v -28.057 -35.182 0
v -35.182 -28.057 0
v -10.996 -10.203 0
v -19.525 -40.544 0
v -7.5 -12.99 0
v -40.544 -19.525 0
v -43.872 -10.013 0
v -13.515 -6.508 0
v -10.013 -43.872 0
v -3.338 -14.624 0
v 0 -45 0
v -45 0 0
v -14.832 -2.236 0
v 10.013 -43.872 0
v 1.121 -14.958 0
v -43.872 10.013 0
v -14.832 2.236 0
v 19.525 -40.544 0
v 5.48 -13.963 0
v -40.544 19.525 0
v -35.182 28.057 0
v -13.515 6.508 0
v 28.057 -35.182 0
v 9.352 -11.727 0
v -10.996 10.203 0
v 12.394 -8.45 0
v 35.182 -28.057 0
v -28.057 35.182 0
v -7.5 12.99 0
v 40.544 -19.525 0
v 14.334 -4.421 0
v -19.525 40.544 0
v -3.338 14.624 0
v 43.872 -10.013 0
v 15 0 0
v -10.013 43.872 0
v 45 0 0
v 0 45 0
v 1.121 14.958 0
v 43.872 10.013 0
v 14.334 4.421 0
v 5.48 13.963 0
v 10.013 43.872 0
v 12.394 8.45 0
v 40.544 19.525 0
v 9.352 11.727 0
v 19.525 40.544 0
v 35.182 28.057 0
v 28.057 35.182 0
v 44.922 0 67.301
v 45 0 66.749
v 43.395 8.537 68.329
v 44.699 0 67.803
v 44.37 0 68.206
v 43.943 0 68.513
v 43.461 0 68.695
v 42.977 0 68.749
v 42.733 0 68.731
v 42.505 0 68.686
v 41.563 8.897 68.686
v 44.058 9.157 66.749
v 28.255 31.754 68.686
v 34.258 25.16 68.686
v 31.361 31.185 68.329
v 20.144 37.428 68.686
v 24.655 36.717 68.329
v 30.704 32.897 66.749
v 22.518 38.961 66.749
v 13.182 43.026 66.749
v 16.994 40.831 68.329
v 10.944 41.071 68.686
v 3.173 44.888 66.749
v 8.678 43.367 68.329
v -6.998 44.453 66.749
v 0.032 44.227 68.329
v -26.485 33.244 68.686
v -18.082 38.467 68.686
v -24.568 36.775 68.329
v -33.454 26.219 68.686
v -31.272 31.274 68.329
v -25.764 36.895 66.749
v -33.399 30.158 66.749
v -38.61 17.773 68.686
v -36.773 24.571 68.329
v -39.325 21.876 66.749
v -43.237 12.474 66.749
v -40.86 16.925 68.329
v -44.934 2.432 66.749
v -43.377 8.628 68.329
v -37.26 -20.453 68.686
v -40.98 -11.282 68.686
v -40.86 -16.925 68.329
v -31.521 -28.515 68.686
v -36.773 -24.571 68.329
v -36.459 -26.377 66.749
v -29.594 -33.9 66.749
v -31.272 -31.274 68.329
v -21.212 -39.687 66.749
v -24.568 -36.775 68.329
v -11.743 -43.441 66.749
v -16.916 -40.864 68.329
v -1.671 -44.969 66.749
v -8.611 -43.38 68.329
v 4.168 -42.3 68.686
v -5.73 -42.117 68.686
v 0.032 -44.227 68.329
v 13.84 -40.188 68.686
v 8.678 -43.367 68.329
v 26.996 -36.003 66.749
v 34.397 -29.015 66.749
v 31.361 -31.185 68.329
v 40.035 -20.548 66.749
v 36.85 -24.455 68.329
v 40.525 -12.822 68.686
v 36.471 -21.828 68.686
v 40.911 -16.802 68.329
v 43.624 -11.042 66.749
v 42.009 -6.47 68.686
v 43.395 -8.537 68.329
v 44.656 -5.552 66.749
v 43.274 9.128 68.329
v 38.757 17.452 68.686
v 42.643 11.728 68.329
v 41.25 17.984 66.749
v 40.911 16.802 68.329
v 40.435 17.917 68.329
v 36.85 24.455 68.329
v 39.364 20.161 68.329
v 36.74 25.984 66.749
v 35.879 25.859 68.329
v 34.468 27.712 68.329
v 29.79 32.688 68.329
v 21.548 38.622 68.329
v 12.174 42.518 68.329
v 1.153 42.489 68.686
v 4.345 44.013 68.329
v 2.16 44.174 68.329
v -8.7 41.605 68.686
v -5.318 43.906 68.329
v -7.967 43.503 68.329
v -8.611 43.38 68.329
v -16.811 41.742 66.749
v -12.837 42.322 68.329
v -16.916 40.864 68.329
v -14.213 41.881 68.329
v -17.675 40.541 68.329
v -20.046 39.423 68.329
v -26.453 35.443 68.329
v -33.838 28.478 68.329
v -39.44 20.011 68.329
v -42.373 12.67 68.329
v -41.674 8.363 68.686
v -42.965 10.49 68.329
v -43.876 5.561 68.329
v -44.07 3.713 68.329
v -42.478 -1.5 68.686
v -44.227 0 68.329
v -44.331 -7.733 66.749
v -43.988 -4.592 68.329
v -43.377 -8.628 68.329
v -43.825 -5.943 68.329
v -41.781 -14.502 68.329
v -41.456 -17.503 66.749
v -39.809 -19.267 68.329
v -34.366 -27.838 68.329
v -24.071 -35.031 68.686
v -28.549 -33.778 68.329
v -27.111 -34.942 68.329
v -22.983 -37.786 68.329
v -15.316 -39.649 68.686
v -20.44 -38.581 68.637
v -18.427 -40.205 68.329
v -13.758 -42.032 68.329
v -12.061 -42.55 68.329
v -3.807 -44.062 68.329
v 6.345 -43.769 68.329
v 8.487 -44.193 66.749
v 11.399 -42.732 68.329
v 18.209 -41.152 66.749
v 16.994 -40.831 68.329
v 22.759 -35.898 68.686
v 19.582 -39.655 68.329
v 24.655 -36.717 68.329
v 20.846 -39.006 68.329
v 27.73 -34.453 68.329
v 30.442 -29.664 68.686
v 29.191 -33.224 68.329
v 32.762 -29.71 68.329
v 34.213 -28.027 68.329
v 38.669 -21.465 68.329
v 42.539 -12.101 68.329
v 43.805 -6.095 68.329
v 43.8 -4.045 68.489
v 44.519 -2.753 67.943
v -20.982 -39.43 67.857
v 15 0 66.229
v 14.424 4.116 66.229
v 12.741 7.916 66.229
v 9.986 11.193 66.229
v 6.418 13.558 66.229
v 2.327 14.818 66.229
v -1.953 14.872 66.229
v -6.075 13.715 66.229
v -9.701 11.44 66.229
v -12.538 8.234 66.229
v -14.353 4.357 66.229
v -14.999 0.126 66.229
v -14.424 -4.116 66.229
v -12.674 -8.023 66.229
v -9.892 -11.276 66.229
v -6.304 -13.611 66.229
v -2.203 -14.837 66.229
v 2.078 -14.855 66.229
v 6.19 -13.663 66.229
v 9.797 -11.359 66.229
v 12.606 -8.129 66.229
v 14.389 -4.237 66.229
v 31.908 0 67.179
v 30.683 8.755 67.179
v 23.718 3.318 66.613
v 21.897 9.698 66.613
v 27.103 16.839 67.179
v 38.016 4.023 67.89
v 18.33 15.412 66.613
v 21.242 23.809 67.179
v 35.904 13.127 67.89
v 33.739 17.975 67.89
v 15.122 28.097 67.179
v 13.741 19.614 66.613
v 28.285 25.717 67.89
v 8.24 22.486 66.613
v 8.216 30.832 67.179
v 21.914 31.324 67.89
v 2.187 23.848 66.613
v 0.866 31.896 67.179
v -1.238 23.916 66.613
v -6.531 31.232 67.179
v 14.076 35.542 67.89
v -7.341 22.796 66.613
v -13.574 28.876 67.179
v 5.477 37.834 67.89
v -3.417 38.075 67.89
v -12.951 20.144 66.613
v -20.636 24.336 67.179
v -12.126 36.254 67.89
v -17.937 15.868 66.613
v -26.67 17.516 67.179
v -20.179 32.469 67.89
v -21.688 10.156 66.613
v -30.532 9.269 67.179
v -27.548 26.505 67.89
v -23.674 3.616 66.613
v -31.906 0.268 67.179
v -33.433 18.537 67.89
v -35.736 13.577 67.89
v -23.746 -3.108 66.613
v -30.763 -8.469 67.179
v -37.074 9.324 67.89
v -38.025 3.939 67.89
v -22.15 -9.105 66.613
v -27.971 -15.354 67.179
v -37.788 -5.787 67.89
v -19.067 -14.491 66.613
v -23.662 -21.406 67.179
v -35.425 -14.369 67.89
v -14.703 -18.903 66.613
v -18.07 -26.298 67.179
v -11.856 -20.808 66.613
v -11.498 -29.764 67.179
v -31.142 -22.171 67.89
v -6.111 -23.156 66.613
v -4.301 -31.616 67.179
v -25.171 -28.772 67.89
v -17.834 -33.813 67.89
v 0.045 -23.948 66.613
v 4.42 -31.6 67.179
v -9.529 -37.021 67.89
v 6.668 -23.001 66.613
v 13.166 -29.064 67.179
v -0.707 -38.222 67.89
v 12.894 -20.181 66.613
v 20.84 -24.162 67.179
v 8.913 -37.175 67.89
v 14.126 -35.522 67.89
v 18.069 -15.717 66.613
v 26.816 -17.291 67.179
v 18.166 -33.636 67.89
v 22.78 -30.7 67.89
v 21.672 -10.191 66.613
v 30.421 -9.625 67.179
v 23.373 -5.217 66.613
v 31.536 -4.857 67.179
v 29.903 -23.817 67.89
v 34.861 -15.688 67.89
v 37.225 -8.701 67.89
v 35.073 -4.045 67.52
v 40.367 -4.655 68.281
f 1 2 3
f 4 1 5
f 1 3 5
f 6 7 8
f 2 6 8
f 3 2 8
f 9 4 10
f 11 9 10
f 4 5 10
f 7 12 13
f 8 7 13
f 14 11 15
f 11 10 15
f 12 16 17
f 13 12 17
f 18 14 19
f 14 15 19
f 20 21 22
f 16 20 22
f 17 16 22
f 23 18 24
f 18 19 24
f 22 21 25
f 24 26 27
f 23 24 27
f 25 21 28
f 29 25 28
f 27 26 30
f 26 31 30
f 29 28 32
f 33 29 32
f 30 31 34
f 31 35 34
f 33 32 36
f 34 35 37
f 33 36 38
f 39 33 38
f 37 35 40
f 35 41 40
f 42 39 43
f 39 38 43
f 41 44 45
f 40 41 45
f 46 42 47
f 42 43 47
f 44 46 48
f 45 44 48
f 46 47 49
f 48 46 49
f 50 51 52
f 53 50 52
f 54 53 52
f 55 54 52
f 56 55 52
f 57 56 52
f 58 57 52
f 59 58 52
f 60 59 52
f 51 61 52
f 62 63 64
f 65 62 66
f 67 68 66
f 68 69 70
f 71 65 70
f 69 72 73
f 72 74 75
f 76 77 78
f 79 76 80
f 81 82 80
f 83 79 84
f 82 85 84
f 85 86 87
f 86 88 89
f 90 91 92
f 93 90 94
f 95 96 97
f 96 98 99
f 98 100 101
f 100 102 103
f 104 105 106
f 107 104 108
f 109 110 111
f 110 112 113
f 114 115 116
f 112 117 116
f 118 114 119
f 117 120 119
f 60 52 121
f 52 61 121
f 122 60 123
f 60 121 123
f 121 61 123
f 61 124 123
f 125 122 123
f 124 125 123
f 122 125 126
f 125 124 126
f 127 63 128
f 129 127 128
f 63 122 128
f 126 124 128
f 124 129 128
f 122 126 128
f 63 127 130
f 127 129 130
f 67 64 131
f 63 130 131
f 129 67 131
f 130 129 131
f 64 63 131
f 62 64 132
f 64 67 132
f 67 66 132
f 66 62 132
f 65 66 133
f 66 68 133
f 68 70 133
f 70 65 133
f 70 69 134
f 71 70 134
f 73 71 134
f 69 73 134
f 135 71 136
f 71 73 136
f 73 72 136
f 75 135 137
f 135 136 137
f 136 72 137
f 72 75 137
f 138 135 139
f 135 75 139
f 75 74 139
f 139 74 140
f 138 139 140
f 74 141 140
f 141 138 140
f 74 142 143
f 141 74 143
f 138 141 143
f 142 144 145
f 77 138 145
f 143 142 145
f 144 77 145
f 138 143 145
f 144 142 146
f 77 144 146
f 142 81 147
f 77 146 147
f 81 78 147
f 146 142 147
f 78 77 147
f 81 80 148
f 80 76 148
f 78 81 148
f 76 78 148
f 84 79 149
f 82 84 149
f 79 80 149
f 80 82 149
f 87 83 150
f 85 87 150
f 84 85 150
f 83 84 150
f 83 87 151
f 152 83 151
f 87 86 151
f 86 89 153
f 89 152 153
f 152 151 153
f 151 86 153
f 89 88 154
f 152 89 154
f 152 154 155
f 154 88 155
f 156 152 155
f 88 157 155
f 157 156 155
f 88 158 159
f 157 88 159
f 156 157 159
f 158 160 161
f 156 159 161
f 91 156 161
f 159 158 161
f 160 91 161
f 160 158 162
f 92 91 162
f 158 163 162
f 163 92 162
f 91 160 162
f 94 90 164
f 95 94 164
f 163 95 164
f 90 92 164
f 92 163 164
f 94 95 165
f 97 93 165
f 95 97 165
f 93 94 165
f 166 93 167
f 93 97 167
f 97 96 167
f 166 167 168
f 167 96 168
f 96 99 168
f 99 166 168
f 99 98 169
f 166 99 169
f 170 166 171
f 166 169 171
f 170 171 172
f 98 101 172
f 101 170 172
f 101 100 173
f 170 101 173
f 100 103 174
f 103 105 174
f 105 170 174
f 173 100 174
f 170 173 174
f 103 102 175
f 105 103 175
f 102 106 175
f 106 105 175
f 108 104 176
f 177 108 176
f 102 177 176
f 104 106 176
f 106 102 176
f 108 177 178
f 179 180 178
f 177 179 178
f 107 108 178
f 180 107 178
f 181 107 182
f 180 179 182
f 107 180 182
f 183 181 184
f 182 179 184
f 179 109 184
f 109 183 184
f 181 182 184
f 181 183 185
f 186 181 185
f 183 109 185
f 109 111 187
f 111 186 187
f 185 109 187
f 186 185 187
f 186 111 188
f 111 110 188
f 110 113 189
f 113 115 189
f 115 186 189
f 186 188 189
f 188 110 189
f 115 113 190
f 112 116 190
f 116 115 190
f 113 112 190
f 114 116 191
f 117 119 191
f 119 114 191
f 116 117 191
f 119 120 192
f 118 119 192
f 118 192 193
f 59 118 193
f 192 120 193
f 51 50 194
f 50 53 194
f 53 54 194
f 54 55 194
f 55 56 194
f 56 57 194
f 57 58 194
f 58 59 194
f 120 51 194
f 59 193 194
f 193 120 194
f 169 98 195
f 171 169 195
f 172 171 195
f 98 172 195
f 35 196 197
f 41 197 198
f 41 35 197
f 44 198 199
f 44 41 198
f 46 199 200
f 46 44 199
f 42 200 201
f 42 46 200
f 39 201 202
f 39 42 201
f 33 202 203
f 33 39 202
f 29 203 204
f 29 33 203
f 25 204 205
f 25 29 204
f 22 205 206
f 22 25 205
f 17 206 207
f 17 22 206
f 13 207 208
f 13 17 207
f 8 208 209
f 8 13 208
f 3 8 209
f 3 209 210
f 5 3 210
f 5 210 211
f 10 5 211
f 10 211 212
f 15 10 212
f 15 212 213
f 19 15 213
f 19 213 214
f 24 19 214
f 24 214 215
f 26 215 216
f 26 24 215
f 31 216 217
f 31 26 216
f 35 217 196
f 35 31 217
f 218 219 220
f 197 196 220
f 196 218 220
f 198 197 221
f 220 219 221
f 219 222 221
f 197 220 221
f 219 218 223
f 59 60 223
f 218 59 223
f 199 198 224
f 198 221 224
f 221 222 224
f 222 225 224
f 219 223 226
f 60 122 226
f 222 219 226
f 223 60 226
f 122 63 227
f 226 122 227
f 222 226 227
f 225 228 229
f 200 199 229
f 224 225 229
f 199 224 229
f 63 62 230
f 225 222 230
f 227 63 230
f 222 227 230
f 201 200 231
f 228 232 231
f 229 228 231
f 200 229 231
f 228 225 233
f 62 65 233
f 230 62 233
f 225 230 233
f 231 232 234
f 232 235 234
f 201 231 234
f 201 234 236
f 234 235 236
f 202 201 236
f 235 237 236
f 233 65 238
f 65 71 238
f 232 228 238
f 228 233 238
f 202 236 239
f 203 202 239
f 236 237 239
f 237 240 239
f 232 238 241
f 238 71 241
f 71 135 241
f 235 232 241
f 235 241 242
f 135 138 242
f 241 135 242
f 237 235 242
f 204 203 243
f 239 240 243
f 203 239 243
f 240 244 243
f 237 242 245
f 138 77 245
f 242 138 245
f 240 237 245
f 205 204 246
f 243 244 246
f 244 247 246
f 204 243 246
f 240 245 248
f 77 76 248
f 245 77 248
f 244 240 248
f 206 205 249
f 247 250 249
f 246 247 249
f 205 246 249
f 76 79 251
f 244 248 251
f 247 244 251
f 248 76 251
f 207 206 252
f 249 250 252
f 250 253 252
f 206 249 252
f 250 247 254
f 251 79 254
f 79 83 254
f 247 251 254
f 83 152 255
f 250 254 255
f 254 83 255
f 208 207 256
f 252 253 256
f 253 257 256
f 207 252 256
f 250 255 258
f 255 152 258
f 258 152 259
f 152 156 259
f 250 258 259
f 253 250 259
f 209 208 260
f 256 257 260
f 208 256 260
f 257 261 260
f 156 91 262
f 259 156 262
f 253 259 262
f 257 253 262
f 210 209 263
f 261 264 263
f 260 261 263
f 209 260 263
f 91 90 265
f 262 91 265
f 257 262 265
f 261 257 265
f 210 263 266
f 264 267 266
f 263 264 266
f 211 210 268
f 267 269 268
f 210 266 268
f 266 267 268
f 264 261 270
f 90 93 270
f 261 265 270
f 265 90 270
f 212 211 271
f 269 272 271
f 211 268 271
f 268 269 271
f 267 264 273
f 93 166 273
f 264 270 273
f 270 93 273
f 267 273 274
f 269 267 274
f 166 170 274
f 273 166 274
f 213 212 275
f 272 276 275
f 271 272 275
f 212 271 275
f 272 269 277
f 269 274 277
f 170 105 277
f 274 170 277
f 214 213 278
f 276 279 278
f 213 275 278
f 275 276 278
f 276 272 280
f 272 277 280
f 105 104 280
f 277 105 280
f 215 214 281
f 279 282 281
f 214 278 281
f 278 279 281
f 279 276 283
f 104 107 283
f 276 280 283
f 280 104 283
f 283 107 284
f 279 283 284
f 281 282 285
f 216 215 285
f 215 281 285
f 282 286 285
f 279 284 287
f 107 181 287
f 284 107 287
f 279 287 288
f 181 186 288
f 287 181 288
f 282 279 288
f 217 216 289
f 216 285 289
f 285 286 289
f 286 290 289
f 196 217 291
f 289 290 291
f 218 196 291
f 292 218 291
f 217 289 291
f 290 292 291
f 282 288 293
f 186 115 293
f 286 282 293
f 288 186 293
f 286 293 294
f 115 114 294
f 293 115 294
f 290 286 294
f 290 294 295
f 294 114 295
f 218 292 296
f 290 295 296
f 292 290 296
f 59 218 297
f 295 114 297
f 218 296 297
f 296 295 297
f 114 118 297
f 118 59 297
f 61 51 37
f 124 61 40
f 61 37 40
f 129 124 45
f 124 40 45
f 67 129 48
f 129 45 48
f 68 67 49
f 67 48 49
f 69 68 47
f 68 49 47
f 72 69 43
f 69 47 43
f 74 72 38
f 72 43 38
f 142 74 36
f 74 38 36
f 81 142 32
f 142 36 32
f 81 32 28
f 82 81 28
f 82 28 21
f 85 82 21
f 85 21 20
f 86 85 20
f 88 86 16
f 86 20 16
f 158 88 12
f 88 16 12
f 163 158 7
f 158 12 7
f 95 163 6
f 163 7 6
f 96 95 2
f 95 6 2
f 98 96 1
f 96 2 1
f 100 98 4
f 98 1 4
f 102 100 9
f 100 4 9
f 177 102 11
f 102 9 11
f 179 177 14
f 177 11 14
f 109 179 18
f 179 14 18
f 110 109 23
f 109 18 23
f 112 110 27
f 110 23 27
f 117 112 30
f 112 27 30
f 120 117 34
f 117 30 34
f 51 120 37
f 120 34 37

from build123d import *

# Parameters (mm, degrees)
F0_R     = 45
F1_DEPTH = 70
F4_R     = 2
F5_R     = 15
F6_DEPTH = 88.4901


with BuildPart() as f1:
    # F0 (on Top) → F1 (new body)
    with BuildSketch(Plane.XY):
        Circle(F0_R)
    extrude(amount=F1_DEPTH)

    # F2 (on Front) → F3 (revolve, cut)
    with BuildSketch(Plane.XZ):
        with BuildLine():
            Line((0, 70), (0, 66))
            add(Edge.make_bspline(
                [(0, 66), (45, 66), (45, 70)],
                knots=[4.7123889804, 4.7123889804, 4.7123889804, 6.2831853072, 6.2831853072, 6.2831853072], degree=2, weights=[1, 0.7071067812, 1]))
            Line((45, 70), (0, 70))
        make_face()
    revolve(axis=Axis((0, 0, 35), (0, 0, 1)), mode=Mode.SUBTRACT)

    # F4
    f4_edges = [f1.edges().sort_by_distance(p)[0] for p in [
        (-45, 0, 70),
    ]]
    fillet(f4_edges, radius=F4_R)

    # F5 (on Top) → F6 (cut)
    with BuildSketch(Plane.XY):
        Circle(F5_R)
    extrude(amount=F6_DEPTH, mode=Mode.SUBTRACT)


solid = f1.part
